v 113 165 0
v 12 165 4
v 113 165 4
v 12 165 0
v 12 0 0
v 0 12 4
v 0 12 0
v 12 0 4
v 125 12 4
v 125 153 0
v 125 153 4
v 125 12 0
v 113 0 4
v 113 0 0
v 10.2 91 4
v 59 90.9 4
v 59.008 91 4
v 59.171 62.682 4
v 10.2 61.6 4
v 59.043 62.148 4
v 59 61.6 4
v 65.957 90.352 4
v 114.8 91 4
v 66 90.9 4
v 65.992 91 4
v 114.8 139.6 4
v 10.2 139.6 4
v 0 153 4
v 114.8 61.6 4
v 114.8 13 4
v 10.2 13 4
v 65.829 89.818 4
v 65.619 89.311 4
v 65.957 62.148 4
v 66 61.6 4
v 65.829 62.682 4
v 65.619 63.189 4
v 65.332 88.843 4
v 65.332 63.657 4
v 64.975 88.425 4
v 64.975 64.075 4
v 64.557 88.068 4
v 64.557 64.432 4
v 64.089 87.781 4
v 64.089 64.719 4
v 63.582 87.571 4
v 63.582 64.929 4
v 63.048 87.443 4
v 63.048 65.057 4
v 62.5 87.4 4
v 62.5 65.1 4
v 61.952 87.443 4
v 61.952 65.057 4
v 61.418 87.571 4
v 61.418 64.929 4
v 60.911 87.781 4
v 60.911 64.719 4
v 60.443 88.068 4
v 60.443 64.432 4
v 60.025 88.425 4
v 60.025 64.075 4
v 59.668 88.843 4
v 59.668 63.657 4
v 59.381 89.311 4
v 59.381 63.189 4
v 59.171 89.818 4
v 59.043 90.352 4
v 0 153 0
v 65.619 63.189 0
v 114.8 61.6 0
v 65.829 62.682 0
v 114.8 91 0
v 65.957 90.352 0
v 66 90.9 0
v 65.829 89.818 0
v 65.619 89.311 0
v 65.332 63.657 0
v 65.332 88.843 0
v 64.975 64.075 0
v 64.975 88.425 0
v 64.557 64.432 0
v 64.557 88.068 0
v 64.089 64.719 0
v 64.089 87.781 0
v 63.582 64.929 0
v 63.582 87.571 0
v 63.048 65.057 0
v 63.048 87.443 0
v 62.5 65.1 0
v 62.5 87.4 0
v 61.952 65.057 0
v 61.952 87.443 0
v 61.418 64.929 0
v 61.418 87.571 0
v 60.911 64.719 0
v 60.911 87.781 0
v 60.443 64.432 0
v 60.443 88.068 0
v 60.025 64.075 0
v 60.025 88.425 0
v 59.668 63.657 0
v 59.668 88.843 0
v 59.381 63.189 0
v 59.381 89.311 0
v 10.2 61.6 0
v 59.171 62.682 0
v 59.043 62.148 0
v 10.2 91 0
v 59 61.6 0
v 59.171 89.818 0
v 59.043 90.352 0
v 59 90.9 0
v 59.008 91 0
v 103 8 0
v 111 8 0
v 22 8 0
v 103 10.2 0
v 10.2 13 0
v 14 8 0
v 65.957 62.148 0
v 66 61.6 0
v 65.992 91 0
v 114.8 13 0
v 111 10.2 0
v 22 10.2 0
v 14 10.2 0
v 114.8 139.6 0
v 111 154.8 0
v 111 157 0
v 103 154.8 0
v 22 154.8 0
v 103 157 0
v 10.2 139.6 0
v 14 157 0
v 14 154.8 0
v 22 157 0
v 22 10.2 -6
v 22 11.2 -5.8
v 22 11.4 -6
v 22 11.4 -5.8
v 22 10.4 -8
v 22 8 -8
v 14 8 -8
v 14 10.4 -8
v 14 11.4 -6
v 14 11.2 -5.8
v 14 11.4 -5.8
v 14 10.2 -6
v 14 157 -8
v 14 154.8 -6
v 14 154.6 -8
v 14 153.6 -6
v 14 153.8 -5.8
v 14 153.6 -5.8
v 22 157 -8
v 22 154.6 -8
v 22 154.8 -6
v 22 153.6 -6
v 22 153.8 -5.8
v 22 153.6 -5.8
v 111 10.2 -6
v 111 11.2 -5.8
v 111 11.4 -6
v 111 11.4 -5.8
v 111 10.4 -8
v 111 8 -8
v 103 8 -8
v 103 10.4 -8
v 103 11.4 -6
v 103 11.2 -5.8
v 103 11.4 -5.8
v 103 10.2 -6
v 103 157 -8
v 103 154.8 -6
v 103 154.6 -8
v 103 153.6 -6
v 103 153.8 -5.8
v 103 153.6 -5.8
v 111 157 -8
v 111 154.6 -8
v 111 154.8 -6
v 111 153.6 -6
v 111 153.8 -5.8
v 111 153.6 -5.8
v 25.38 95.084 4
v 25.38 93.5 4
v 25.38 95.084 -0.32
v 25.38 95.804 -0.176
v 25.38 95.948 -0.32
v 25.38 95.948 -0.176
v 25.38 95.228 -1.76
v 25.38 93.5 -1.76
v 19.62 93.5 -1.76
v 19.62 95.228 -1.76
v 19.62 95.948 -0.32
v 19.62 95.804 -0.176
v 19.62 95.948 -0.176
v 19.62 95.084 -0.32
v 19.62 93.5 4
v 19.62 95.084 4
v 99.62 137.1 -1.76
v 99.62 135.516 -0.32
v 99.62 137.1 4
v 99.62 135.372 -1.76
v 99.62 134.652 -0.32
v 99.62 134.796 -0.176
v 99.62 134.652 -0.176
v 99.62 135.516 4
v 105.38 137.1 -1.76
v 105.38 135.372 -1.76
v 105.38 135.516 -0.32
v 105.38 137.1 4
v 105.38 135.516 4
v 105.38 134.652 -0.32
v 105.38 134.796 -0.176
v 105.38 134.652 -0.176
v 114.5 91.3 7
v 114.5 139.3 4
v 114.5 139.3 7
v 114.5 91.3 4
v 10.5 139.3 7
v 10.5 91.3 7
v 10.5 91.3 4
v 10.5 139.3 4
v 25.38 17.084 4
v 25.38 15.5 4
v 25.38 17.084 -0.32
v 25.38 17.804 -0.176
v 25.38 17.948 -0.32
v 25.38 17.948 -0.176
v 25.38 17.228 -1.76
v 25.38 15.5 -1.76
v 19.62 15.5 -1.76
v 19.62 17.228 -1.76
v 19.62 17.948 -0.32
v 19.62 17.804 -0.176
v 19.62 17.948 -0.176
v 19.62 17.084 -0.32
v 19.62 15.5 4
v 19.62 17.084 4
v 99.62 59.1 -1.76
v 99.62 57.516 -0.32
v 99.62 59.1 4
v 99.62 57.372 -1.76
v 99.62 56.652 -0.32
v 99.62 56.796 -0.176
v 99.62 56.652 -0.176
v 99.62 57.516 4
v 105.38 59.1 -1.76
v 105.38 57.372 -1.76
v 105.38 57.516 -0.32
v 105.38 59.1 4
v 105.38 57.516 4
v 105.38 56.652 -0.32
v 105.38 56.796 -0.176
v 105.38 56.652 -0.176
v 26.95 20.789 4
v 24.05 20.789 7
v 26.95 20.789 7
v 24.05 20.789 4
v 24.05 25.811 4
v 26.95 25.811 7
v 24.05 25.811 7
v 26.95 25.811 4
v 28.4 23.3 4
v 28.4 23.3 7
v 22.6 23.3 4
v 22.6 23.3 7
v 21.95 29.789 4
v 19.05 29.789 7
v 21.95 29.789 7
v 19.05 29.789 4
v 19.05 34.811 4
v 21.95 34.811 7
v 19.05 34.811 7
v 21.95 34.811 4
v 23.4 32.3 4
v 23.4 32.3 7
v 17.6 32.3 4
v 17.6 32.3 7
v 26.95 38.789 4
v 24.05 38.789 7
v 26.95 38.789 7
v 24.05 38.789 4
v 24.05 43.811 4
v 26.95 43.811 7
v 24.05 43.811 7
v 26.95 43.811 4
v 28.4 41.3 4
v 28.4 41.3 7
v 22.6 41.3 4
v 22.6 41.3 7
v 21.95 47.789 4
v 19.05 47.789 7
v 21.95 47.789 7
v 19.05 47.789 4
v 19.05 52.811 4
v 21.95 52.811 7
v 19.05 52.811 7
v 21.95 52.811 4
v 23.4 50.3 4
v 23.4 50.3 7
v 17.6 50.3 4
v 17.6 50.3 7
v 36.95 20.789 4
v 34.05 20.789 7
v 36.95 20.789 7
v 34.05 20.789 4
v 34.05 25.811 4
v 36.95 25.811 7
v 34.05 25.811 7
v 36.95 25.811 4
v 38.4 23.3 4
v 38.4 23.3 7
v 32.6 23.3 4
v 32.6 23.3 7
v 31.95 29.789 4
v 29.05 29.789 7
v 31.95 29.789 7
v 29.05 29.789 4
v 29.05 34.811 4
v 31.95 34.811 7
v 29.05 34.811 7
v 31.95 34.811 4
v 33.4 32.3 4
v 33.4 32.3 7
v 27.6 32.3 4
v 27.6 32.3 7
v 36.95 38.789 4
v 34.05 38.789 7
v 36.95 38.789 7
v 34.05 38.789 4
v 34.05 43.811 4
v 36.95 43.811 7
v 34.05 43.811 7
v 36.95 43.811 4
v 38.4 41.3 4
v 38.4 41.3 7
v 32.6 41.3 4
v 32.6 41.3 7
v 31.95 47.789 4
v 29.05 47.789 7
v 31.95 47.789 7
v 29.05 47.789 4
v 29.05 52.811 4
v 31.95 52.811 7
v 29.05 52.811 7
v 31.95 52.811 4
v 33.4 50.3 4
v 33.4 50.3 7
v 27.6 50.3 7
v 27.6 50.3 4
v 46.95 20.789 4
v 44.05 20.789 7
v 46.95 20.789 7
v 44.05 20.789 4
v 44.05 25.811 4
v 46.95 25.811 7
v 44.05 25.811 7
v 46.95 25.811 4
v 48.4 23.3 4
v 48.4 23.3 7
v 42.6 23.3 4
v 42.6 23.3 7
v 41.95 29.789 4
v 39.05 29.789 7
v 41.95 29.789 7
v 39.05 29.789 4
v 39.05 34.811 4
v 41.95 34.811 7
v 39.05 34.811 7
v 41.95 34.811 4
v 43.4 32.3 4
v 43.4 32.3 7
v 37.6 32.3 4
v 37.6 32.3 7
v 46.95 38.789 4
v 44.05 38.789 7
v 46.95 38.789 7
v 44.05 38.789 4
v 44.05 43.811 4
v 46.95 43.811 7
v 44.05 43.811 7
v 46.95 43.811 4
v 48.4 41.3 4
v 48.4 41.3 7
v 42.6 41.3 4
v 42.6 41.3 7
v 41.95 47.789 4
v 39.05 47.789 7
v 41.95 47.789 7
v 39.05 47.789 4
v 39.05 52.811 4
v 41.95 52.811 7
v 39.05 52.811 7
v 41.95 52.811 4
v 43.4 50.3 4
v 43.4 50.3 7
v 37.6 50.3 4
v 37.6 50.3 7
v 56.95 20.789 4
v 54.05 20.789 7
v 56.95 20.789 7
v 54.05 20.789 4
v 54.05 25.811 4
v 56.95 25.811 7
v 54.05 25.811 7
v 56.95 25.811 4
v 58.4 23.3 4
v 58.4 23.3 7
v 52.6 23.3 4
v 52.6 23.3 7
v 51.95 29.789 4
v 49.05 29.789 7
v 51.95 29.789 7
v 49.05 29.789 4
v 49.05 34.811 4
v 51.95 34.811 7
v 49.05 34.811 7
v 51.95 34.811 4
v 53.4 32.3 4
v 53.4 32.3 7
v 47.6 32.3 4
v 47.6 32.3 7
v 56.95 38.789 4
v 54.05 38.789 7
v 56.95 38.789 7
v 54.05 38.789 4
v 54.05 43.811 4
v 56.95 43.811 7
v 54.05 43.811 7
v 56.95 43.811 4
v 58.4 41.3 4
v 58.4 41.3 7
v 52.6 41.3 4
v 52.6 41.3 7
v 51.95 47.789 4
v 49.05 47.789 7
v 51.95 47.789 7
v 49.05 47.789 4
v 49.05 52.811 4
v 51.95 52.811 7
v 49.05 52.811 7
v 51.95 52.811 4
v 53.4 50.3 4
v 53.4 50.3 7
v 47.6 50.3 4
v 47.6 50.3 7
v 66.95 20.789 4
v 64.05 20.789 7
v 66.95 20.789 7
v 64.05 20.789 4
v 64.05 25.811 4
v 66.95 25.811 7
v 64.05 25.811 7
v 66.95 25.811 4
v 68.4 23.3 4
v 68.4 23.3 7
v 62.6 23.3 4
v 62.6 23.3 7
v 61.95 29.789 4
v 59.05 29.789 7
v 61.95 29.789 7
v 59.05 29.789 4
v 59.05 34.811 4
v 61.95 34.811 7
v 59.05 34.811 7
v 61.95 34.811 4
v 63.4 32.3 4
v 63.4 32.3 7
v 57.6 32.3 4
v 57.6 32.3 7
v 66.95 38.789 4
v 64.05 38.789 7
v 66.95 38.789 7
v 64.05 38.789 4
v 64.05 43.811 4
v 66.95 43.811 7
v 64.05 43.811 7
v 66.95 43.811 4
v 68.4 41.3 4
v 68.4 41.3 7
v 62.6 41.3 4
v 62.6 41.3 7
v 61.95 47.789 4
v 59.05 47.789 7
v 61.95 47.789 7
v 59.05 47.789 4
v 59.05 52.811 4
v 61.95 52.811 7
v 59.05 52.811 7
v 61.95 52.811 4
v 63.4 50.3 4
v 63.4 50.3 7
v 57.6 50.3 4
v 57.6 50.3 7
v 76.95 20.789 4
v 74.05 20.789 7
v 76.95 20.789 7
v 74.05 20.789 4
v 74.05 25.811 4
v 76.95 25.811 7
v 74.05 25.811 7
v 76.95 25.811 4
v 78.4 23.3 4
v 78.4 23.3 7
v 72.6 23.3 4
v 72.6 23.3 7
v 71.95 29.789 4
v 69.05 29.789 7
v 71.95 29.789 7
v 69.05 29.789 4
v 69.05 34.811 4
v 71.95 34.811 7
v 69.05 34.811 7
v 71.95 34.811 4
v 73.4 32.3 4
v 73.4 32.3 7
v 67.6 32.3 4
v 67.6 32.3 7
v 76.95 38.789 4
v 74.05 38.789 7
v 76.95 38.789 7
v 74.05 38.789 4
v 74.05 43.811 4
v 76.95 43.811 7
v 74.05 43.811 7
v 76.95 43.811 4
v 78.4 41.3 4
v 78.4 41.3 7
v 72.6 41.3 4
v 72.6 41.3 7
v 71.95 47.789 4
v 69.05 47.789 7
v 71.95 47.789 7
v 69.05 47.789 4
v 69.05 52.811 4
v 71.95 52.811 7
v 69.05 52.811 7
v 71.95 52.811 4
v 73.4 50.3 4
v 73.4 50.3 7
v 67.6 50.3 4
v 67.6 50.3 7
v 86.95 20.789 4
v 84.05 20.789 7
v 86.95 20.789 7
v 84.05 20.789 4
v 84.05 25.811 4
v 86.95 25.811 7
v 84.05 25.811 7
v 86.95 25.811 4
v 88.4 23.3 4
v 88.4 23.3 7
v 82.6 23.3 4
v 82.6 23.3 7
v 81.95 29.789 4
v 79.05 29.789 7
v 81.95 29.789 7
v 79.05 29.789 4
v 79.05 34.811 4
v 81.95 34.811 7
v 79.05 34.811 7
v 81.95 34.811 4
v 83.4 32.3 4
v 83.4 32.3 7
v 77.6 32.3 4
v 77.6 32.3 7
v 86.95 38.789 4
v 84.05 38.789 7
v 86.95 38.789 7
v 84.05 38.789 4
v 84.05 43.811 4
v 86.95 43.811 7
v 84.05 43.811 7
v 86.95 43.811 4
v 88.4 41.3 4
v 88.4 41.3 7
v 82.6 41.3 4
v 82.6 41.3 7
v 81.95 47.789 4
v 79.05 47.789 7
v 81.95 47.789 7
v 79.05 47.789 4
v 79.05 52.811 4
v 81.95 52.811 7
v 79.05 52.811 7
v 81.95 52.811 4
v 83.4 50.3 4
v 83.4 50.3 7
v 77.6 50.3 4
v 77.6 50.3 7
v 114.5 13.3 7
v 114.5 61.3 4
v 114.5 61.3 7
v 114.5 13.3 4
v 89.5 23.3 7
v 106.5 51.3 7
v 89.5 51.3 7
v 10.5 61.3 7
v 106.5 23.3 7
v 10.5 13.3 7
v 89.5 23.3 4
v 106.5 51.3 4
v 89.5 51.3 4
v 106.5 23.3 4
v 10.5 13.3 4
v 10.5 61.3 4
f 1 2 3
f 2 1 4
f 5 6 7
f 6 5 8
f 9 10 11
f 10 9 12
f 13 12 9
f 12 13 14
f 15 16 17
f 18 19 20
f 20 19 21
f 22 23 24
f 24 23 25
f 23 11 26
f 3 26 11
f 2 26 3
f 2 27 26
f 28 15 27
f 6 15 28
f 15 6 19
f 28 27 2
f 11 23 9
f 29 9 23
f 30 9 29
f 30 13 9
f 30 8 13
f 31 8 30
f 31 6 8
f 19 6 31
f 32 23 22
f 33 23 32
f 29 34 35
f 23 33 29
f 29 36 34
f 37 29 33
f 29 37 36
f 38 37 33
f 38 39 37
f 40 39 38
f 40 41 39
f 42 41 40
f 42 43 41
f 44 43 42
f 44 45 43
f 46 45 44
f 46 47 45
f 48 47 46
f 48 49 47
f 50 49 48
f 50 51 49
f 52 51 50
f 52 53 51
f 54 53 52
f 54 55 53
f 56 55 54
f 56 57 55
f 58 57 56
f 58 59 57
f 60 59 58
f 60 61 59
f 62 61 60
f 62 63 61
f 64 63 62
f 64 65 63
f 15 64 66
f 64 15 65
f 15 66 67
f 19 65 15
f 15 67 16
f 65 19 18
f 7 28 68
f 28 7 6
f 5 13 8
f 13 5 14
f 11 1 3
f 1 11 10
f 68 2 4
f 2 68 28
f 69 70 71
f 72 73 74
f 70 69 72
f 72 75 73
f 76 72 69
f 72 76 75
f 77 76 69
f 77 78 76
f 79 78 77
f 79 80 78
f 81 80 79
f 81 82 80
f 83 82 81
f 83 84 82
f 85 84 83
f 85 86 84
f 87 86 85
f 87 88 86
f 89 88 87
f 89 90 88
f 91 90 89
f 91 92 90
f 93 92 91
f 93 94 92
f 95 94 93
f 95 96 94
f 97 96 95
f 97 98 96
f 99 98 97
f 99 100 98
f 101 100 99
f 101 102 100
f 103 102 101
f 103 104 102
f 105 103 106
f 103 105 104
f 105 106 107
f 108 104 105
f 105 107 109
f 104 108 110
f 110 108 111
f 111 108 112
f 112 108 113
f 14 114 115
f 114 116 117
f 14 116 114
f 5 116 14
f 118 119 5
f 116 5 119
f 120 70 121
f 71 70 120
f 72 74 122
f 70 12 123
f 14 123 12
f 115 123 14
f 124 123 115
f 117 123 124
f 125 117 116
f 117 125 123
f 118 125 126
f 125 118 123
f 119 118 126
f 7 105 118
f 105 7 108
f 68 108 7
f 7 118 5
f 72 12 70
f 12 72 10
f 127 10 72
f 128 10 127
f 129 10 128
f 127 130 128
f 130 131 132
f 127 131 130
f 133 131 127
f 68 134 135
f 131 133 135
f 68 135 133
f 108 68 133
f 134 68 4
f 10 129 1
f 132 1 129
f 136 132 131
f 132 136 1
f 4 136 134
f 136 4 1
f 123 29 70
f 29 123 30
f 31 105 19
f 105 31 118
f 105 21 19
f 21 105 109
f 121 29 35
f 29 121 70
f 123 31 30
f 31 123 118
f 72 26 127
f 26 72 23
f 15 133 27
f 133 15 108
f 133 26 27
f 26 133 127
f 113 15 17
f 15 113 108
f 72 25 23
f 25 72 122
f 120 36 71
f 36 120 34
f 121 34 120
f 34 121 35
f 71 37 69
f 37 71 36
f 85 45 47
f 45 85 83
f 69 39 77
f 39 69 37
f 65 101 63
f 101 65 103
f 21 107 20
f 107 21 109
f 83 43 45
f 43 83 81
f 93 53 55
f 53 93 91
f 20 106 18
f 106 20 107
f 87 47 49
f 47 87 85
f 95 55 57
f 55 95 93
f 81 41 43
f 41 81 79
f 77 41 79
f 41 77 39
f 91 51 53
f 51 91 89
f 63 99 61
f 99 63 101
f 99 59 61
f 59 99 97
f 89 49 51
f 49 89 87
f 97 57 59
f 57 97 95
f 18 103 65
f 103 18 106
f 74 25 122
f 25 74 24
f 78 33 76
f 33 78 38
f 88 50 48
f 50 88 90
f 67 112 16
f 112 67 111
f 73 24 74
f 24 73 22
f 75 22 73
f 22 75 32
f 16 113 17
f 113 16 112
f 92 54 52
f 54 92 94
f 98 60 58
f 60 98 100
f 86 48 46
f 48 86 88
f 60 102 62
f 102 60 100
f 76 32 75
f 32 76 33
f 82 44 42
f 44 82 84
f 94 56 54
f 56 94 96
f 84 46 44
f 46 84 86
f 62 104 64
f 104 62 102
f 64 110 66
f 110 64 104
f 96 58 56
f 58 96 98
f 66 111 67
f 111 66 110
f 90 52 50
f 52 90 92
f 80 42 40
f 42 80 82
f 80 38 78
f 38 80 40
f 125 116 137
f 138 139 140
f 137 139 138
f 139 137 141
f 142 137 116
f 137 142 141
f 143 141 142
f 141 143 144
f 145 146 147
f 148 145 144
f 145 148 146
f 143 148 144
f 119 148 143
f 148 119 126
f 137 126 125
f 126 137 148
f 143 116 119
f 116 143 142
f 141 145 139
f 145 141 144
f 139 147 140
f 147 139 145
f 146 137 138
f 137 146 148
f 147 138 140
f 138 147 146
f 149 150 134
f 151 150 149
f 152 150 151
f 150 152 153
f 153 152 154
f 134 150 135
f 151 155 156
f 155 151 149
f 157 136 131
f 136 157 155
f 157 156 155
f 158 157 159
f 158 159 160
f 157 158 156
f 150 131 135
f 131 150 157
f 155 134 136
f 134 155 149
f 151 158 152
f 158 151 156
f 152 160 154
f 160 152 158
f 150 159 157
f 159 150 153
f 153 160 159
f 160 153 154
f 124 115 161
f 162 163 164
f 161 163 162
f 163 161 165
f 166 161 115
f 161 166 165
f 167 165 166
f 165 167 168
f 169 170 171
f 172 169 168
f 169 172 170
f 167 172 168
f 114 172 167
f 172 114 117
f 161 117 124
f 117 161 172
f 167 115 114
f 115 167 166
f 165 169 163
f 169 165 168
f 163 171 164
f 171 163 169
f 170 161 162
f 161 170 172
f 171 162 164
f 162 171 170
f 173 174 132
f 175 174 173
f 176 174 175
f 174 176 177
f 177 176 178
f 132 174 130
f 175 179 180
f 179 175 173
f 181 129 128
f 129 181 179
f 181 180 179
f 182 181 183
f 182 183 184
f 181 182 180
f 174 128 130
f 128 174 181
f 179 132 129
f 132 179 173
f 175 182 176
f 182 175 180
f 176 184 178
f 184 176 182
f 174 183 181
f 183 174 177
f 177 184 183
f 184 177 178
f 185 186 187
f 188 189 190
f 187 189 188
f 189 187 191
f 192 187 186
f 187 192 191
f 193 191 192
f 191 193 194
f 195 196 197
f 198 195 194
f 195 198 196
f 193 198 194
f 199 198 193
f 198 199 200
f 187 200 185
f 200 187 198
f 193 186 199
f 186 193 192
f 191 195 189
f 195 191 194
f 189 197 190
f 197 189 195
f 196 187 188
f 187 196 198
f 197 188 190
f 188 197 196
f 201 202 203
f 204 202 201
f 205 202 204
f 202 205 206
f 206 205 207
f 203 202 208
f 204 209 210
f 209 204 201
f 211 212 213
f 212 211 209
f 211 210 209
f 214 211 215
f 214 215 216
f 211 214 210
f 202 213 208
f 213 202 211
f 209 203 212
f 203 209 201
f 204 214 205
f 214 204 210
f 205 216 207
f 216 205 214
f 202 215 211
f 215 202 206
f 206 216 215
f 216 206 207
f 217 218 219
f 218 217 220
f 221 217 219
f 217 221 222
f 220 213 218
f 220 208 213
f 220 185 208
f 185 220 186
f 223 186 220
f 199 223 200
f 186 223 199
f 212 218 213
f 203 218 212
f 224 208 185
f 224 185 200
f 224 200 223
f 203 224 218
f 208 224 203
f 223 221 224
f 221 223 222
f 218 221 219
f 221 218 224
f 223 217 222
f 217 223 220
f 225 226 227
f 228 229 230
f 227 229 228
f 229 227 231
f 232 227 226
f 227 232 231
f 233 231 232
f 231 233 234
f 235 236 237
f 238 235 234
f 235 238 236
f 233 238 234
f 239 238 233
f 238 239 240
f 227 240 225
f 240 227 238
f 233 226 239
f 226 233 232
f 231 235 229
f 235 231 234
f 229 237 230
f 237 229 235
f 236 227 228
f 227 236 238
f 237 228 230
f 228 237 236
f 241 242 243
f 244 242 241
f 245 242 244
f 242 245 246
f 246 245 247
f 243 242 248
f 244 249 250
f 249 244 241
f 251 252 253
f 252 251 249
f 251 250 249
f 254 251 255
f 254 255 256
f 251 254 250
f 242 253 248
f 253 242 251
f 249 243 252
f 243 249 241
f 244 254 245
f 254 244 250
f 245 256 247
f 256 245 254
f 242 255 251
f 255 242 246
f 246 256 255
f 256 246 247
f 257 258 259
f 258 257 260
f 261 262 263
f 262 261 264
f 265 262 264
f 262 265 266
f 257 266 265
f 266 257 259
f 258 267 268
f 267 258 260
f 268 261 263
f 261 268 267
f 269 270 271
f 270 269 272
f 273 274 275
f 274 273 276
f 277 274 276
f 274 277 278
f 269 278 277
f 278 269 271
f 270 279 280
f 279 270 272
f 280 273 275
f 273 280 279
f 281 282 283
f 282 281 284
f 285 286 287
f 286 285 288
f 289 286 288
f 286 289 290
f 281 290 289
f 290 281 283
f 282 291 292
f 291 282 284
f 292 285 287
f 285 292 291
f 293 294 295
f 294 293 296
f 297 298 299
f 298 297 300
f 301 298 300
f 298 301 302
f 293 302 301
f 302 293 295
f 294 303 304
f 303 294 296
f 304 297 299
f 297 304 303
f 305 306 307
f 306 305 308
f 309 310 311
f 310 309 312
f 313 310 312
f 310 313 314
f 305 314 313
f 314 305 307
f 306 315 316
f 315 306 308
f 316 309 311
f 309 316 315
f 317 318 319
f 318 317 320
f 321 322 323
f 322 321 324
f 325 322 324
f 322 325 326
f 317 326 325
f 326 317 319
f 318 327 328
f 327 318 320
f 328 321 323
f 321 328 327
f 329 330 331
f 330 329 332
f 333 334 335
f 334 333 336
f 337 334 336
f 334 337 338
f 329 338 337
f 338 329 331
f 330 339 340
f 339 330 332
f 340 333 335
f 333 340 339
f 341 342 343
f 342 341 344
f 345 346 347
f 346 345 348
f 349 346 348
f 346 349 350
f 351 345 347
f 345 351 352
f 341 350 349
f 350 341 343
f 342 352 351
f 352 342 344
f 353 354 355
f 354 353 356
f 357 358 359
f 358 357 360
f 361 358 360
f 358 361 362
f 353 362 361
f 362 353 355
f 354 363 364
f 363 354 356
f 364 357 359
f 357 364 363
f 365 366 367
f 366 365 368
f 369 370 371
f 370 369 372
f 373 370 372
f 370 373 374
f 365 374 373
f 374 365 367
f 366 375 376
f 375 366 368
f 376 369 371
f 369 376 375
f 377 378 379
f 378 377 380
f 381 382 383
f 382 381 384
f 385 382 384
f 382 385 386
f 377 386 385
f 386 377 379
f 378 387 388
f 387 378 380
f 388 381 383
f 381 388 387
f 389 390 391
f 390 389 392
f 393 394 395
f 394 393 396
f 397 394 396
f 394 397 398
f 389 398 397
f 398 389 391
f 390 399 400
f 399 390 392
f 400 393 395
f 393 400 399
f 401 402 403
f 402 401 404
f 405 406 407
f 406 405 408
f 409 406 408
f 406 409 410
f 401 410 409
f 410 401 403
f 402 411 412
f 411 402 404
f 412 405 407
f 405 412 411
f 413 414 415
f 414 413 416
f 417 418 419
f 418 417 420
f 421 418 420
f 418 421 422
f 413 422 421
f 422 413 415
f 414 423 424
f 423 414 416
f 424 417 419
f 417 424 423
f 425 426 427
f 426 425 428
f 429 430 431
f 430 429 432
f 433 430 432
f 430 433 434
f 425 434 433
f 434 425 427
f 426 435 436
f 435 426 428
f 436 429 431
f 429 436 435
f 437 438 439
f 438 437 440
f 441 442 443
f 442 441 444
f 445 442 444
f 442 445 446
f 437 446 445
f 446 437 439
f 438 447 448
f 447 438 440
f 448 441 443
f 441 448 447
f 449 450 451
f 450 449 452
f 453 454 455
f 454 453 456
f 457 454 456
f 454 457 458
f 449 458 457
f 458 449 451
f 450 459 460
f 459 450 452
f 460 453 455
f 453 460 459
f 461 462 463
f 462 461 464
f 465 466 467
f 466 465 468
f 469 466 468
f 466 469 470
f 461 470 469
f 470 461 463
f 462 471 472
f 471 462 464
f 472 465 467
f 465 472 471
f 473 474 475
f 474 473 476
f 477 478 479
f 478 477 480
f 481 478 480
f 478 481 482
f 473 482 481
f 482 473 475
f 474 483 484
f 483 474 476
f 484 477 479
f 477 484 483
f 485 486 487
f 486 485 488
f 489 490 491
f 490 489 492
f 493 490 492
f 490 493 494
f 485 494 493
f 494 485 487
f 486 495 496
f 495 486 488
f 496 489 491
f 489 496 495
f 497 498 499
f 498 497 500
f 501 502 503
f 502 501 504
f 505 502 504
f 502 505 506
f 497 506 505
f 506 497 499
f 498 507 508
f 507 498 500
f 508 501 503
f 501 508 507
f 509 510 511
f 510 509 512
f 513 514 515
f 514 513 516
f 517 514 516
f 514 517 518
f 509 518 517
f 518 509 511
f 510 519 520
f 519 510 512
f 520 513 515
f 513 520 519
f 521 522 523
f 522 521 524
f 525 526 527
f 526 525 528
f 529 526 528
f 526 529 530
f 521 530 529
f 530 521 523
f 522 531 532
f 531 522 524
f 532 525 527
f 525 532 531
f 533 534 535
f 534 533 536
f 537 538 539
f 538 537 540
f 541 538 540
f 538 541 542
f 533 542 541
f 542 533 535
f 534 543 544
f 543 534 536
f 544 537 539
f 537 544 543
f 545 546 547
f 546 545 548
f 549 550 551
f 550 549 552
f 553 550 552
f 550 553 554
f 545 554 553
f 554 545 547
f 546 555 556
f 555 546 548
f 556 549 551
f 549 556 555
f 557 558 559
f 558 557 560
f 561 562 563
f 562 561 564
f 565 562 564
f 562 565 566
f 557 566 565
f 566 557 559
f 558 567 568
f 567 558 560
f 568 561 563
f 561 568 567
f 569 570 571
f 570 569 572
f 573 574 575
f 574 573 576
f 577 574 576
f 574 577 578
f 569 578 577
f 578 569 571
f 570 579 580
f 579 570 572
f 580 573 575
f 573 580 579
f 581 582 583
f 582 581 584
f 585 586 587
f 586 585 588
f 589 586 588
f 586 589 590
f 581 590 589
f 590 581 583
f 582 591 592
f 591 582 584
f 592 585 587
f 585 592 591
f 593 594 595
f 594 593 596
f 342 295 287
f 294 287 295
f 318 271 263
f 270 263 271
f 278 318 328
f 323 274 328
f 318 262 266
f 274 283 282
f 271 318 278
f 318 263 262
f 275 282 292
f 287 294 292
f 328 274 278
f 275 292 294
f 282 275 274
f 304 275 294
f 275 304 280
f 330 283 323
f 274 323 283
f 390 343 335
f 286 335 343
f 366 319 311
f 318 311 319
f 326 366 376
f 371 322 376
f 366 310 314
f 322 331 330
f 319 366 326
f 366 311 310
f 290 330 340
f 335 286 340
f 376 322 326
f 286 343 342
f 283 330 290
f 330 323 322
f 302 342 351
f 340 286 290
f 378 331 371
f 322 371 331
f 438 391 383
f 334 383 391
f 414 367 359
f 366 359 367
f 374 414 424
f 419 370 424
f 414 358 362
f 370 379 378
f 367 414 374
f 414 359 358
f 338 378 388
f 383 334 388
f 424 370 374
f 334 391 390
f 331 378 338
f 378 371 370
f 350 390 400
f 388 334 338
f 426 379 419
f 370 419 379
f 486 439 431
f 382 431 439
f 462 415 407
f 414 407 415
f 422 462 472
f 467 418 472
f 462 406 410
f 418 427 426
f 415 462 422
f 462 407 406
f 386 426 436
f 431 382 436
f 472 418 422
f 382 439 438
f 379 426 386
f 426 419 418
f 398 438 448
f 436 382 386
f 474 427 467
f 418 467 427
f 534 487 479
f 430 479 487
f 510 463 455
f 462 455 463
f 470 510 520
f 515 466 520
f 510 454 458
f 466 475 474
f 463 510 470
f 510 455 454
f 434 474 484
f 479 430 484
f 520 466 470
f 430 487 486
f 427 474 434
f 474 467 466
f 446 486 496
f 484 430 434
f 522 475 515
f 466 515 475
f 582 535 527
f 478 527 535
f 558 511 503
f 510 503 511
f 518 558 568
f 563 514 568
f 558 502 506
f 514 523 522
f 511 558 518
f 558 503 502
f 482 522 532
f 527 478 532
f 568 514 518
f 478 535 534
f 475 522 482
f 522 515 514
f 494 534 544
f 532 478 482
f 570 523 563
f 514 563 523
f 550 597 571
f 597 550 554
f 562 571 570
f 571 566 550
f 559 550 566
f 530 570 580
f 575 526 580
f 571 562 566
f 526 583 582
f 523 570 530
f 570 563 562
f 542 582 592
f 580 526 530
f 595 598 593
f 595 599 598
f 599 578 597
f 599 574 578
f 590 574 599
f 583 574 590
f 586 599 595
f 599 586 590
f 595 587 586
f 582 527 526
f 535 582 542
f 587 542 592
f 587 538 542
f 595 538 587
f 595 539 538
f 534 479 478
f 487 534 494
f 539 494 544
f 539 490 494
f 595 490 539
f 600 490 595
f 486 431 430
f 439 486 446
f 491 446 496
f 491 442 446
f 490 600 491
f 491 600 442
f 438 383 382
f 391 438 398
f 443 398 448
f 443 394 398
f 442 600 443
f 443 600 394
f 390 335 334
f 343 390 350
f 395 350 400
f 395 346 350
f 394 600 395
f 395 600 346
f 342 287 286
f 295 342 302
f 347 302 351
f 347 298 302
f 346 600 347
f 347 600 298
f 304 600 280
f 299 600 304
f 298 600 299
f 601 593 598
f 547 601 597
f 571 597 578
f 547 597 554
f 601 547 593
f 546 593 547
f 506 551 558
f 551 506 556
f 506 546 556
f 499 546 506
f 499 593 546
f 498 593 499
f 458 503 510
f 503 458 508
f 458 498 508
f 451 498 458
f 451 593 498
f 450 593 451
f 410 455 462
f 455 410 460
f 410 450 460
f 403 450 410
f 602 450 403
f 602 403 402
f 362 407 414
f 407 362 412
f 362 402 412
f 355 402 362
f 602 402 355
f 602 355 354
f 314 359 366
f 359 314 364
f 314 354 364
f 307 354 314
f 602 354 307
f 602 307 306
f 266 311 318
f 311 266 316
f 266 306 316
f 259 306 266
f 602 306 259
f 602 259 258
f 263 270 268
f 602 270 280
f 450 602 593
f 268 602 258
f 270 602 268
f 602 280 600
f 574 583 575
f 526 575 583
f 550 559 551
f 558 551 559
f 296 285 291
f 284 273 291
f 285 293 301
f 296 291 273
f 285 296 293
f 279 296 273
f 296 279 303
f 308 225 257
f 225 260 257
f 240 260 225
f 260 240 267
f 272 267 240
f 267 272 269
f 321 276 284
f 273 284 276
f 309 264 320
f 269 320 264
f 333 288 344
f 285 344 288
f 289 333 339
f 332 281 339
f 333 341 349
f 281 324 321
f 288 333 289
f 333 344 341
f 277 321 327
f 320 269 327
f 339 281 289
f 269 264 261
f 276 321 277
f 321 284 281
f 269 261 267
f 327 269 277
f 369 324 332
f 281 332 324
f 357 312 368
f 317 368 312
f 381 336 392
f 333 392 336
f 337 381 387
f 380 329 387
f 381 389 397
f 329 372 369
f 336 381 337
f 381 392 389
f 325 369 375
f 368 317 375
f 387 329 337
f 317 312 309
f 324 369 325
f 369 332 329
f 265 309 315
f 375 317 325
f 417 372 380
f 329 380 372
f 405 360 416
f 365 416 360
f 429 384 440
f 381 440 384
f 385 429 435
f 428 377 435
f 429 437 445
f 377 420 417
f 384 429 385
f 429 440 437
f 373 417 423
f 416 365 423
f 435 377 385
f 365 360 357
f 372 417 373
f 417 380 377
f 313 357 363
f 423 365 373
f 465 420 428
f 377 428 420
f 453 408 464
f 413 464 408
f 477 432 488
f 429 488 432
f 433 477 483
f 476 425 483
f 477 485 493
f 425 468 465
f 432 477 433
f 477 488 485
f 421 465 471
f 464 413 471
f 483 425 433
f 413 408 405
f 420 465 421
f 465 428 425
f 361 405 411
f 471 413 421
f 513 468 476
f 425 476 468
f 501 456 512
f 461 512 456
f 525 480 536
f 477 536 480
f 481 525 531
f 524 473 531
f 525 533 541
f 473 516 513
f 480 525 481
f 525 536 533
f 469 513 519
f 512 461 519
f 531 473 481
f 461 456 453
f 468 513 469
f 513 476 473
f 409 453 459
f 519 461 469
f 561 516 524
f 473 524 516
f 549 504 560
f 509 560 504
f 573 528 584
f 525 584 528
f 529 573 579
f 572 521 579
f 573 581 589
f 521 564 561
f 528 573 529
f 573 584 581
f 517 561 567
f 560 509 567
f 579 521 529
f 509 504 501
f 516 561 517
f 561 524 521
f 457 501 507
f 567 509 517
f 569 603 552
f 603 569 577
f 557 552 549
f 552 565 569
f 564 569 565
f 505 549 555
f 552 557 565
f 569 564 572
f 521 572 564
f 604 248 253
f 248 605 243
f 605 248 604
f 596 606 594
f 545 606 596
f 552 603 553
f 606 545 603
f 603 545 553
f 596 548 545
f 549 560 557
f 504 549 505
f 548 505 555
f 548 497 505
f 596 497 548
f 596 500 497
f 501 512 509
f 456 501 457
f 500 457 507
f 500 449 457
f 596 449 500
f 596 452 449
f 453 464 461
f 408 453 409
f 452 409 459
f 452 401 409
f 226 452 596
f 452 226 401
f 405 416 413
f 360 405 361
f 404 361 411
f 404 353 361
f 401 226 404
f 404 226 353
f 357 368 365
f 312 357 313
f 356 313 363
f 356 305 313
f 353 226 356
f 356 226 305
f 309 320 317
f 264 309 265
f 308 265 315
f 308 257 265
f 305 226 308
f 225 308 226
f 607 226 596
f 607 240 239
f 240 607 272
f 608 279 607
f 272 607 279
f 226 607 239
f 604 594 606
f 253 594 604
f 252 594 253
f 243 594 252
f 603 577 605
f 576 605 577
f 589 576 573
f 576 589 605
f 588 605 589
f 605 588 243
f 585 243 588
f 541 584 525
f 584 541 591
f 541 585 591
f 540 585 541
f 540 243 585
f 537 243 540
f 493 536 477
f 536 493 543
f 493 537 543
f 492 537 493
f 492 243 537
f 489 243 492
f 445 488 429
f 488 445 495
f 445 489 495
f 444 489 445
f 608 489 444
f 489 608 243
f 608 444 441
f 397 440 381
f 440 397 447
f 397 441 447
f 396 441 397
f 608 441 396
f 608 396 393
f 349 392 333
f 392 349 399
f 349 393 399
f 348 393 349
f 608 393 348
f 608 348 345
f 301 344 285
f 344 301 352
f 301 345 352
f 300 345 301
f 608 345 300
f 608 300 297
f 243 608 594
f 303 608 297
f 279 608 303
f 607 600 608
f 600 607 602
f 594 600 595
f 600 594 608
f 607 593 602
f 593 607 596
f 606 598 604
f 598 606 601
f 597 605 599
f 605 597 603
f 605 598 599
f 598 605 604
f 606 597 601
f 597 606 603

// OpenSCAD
// file: lib/snap-interface.scad
// Hidden panel snap interface v0.1.
// Print and test the coupon before committing full panels to a printer.

snap_arm_width = 8;
snap_arm_thickness = 2.2;
snap_arm_drop = 8;
snap_barb_depth = 1.0;
snap_barb_height = 2.0;
snap_slot_clearance = 0.30;

module snap_hook() {
    // Panel underside is Z=0; hook extends downward.
    union() {
        translate([-snap_arm_width / 2, 0, -snap_arm_drop])
            cube([snap_arm_width, snap_arm_thickness, snap_arm_drop + 0.4]);
        hull() {
            translate([-snap_arm_width / 2, snap_arm_thickness, -snap_arm_drop])
                cube([snap_arm_width, 0.2, snap_barb_height]);
            translate([-snap_arm_width / 2, snap_arm_thickness + snap_barb_depth, -snap_arm_drop + snap_barb_height])
                cube([snap_arm_width, 0.2, 0.2]);
        }
    }
}

module snap_receiver_slot(depth = 8) {
    translate([
        -snap_arm_width / 2 - snap_slot_clearance,
        -0.1,
        -snap_arm_drop - snap_slot_clearance
    ])
        cube([
            snap_arm_width + 2 * snap_slot_clearance,
            depth + 0.2,
            snap_arm_drop + 2 * snap_slot_clearance
        ]);
}
// main file
// Flush Nyacom-style rear panel with replaceable I/O and PSU inserts.
// Exact connector apertures remain intentionally parametric/provisional.
include <lib/snap-interface.scad>

$fn = 40;

part = "assembly"; // rear-panel | io-blank | cisco | flexatx | assembly

rear_panel = [125, 165, 4];
rear_chamfer = 12;
module_face = [104, 48, 3];

psu_opening_origin = [10.2, 13];
io_opening_origin = [10.2, 91];
opening = [104.6, 48.6];

cisco_rear_provisional = [96, 40];
flexatx_rear_provisional = [81.5, 40.5];

module chamfered_panel_2d(width, height, cut) {
    polygon([
        [cut, 0], [width - cut, 0], [width, cut],
        [width, height - cut], [width - cut, height],
        [cut, height], [0, height - cut], [0, cut]
    ]);
}

module capsule(length, width, depth) {
    hull() {
        translate([-length / 2 + width / 2, 0, 0]) cylinder(h = depth, d = width);
        translate([ length / 2 - width / 2, 0, 0]) cylinder(h = depth, d = width);
    }
}

module rear_main_panel() {
    color([0.88, 0.13, 0.08])
    difference() {
        linear_extrude(height = rear_panel[2])
            chamfered_panel_2d(rear_panel[0], rear_panel[1], rear_chamfer);

        translate([psu_opening_origin[0], psu_opening_origin[1], -0.1])
            cube([opening[0], opening[1], rear_panel[2] + 0.2]);
        translate([io_opening_origin[0], io_opening_origin[1], -0.1])
            cube([opening[0], opening[1], rear_panel[2] + 0.2]);

        // Concealed release notches between the two modules.
        translate([rear_panel[0] / 2, psu_opening_origin[1] + opening[1], -0.1])
            cylinder(h = rear_panel[2] + 0.2, d = 7);
        translate([rear_panel[0] / 2, io_opening_origin[1] - 0.1, -0.1])
            cylinder(h = rear_panel[2] + 0.2, d = 7);
    }

    // Main rear insert snaps into the coloured end ring.
    for (x = [18, rear_panel[0] - 18]) {
        translate([x, 8, 0]) snap_hook();
        translate([x, rear_panel[1] - 8, 0]) rotate([0, 0, 180]) snap_hook();
    }
}

module module_hooks() {
    translate([12, 2.2, 0]) scale([0.72, 0.72, 0.72]) snap_hook();
    translate([module_face[0] - 12, module_face[1] - 2.2, 0])
        rotate([0, 0, 180]) scale([0.72, 0.72, 0.72]) snap_hook();
}

module io_blank() {
    color([0.16, 0.17, 0.19]) {
        cube(module_face);
        module_hooks();
    }
}

module cisco_insert() {
    color([0.16, 0.17, 0.19])
    difference() {
        cube(module_face);

        // Provisional PSU exhaust field; the power inlet remains blank until measured.
        for (x = [10 : 10 : 70], y = [10 : 9 : 38])
            translate([x + ((round(y / 9) % 2) * 5), y, -0.1])
                cylinder(h = module_face[2] + 0.2, d = 5.8, $fn = 6);

        // Replaceable blank cable/connector zone.
        translate([79, 10, -0.1]) cube([17, 28, module_face[2] + 0.2]);
    }
    module_hooks();
}

module flexatx_insert() {
    color([0.16, 0.17, 0.19])
    difference() {
        cube(module_face);

        // Generic FlexATX rear envelope, not final mounting holes.
        translate([(module_face[0] - flexatx_rear_provisional[0]) / 2,
                   (module_face[1] - flexatx_rear_provisional[1]) / 2,
                   -0.1])
            cube([flexatx_rear_provisional[0], flexatx_rear_provisional[1], module_face[2] + 0.2]);
    }
    module_hooks();
}

if (part == "rear-panel") rear_main_panel();
else if (part == "io-blank") io_blank();
else if (part == "cisco") cisco_insert();
else if (part == "flexatx") flexatx_insert();
else {
    rear_main_panel();
    translate([io_opening_origin[0] + 0.3, io_opening_origin[1] + 0.3, rear_panel[2]]) io_blank();
    translate([psu_opening_origin[0] + 0.3, psu_opening_origin[1] + 0.3, rear_panel[2]]) cisco_insert();
}

echo("part", part);
echo("rear_panel_mm", rear_panel);
echo("standard_module_face_mm", module_face);
echo("cisco_rear_envelope_provisional_mm", cisco_rear_provisional);
echo("flexatx_rear_envelope_provisional_mm", flexatx_rear_provisional);
assert(rear_panel[0] <= 250 && rear_panel[1] <= 250, "Rear panel exceeds 250 mm print-bed limit");
